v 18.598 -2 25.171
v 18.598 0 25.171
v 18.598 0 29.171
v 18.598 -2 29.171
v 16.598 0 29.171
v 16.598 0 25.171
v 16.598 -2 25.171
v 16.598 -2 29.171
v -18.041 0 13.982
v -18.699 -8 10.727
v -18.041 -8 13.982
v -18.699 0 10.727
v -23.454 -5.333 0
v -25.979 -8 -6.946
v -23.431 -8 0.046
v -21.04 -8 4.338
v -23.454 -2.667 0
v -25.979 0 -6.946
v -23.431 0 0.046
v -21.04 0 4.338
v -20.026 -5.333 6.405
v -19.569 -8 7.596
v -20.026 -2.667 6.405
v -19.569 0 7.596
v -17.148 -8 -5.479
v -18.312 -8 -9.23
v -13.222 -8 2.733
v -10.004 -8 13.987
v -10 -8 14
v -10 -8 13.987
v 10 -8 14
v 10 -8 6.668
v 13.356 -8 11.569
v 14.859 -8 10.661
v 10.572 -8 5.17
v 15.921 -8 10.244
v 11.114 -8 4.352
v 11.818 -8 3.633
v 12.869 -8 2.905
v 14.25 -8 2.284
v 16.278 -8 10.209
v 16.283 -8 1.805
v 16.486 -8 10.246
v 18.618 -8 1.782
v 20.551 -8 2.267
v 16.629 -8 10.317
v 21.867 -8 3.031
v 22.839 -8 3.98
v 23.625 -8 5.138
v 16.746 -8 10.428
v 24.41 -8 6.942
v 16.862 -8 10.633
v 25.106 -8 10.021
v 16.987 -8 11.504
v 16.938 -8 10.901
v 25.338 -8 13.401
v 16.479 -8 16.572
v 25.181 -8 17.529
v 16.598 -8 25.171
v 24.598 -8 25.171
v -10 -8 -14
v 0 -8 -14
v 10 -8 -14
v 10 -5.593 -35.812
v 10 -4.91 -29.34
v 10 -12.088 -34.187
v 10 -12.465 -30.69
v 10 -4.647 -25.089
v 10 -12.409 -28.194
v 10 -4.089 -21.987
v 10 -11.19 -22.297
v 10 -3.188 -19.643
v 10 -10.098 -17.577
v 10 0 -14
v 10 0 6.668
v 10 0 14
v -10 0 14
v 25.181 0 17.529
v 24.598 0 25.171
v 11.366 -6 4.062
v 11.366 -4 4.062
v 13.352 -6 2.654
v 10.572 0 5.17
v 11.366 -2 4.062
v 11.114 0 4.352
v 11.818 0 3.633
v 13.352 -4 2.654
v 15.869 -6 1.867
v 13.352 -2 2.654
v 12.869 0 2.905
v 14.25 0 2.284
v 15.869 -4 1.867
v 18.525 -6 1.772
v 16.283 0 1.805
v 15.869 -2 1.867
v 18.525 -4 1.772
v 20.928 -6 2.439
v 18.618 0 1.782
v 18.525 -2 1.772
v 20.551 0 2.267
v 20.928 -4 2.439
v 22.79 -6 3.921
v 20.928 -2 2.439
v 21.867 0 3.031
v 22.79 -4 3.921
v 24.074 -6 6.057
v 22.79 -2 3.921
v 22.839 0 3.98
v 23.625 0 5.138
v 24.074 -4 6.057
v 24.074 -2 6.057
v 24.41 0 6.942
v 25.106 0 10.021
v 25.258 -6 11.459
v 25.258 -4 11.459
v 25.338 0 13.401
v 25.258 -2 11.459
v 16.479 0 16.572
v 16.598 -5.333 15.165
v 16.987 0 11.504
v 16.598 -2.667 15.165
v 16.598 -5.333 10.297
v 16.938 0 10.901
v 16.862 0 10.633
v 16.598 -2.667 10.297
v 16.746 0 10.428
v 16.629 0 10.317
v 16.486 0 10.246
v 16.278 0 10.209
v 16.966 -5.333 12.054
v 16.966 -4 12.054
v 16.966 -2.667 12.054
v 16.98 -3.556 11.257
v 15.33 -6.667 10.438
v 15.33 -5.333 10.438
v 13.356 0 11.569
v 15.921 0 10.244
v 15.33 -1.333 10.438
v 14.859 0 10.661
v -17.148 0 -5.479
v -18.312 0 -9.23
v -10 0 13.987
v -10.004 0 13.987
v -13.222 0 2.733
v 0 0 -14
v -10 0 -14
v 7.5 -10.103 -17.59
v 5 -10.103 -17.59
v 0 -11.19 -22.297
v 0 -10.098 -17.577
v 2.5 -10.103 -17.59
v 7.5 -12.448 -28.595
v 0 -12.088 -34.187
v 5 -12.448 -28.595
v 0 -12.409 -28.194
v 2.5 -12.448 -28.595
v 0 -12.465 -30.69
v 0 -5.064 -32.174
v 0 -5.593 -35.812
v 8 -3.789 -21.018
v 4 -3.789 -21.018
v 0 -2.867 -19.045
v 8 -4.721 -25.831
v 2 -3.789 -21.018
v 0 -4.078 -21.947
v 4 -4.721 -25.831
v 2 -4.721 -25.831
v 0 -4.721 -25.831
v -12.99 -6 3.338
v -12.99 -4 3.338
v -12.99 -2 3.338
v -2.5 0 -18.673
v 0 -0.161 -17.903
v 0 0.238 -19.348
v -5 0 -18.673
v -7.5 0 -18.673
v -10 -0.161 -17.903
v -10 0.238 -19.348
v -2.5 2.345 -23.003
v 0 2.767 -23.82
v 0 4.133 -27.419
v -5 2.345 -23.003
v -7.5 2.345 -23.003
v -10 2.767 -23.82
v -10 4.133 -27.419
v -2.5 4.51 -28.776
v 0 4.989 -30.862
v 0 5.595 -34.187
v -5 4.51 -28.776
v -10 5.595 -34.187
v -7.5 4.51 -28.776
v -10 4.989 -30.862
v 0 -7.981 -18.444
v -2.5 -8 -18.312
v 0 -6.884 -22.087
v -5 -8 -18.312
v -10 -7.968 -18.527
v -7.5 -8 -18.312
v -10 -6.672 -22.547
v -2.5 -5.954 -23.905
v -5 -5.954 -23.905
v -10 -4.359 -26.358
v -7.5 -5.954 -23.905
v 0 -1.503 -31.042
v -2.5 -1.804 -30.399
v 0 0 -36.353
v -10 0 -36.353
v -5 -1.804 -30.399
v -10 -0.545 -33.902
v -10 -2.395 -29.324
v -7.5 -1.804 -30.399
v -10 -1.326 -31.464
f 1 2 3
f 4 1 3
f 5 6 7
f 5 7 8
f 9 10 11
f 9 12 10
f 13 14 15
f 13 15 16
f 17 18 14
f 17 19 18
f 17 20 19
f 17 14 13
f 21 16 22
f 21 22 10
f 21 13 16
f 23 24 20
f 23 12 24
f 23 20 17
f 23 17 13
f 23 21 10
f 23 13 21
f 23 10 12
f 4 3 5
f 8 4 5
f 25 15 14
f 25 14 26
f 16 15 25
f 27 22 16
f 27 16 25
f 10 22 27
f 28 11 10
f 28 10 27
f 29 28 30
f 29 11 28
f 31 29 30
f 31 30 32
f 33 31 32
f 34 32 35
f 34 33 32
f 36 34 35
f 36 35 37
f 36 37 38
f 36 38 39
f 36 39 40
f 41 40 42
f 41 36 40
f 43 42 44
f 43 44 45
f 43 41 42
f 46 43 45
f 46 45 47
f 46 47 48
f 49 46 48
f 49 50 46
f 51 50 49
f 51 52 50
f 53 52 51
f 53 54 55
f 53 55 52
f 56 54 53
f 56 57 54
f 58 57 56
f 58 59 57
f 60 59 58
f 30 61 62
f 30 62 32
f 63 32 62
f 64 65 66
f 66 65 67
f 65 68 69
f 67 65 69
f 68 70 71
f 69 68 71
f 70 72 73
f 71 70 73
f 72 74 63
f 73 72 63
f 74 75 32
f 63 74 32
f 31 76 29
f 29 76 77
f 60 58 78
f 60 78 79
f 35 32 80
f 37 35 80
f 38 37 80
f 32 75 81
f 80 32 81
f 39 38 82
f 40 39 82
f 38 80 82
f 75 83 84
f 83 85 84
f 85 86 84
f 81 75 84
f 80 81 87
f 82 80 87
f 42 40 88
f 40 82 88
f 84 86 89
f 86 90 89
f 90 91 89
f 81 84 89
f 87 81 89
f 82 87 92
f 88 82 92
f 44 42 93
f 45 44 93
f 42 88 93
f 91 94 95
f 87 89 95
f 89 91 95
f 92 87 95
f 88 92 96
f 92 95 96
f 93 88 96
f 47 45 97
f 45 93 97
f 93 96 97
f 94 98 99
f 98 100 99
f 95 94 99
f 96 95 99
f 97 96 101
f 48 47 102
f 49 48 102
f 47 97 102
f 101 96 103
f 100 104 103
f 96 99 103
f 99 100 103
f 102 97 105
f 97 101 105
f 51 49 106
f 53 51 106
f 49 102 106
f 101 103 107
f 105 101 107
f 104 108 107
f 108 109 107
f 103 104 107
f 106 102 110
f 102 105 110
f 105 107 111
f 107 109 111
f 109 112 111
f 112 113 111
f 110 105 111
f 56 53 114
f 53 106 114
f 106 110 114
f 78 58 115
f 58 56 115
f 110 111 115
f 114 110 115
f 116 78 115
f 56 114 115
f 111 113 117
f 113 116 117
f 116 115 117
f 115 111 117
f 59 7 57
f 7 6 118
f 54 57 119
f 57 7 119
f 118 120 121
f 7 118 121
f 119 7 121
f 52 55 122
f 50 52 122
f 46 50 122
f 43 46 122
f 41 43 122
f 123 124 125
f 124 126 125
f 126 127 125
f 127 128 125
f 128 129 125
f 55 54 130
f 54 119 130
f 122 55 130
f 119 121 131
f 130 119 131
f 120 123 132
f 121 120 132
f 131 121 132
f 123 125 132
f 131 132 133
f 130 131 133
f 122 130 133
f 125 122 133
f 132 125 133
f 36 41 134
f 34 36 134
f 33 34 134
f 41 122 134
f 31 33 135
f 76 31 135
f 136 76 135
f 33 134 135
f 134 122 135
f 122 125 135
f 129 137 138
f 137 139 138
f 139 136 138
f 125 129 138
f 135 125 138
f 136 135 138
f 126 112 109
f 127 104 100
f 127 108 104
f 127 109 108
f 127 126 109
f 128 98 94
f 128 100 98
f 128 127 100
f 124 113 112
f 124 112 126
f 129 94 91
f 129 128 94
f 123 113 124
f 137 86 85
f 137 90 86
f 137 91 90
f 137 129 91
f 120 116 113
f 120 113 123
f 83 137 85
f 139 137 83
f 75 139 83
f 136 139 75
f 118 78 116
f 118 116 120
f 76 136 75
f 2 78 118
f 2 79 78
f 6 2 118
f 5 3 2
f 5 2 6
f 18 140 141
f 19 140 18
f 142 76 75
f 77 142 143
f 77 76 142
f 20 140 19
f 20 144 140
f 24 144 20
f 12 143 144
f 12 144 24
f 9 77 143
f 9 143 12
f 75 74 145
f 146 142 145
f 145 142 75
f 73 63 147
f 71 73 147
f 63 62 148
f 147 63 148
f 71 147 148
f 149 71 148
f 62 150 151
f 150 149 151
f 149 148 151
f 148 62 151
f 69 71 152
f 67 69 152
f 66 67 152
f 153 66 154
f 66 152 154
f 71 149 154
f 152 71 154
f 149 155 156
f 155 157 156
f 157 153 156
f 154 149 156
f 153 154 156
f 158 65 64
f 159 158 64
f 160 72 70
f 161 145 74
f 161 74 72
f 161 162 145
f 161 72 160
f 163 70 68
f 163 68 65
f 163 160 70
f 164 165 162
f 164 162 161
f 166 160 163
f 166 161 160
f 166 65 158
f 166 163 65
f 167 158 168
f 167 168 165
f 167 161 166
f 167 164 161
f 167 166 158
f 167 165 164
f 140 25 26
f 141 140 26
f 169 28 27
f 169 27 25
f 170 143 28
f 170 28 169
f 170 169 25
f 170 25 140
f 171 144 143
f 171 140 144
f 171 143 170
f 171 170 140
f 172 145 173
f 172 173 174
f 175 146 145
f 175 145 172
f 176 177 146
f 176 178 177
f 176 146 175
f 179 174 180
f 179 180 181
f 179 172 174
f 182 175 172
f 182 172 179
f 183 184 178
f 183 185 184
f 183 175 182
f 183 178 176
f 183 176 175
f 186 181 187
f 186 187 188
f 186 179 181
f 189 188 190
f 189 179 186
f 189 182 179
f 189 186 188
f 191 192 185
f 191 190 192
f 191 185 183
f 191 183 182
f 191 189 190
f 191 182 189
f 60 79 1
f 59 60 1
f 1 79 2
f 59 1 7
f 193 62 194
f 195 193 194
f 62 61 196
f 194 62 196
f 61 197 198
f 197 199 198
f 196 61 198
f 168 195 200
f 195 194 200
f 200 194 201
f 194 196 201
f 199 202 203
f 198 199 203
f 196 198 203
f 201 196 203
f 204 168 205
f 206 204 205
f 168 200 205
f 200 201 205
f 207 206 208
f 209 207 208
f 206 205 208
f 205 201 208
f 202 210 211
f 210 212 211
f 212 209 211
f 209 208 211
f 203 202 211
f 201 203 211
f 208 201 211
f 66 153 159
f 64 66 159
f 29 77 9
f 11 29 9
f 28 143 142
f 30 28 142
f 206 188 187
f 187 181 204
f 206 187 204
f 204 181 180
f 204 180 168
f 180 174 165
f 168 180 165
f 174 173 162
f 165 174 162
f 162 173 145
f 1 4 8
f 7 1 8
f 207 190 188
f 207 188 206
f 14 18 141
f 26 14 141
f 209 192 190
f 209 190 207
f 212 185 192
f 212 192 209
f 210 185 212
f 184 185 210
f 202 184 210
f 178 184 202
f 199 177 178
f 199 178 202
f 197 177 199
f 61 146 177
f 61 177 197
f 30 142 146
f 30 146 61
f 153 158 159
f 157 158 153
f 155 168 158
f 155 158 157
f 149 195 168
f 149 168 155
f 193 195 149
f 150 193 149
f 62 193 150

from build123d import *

# Parameters (mm, degrees)
F1_DEPTH = 8
F3_DEPTH = 10
F5_DEPTH = 10
F6_W     = 2
F6_H     = 4
F7_DEPTH = 2


with BuildPart() as f1:
    # F0 (on Front) → F1 (new body)
    with BuildSketch(Plane.XZ):
        Polygon((10, 14), (-10, 14), (-10, 13.9871324164), align=None)
        with BuildLine():
            Line((-10, 13.9871324164), (-10, 14))
            add(Edge.make_bspline(
                [(-10, 14), (-10.0013069916, 13.9957099885), (-10.0026139149, 13.9914199529), (-10.0039207687, 13.9871298939)],
                knots=[0, 0, 0, 0, 0.0005634153, 0.0005634153, 0.0005634153, 0.0005634153], degree=3))
            Line((-10.0039207687, 13.9871298939), (-10, 13.9871324164))
        make_face()
        with BuildLine():
            add(Edge.make_bspline(
                [(-10, 14), (-10.0013069916, 13.9957099885), (-10.0026139149, 13.9914199529), (-10.0039207687, 13.9871298939)],
                knots=[0, 0, 0, 0, 0.0005634153, 0.0005634153, 0.0005634153, 0.0005634153], degree=3))
            Line((-10, 14), (-18.0412381887, 13.9819588512))
            Line((-18.0412381887, 13.9819588512), (-10.0039207687, 13.9871298939))
        make_face()
        with BuildLine():
            add(Edge.make_bspline(
                [(16.5979396552, 25.1705870032), (16.4242079195, 21.7814034546), (16.1292929338, 16.0281597324), (17.954552315, 8.034475712), (12.8387475955, 11.8710784645), (10, 14)],
                knots=[0, 0, 0, 0, 0.3895409215, 0.6612577422, 1, 1, 1, 1], degree=3))
            Line((10, 14), (10, 6.6676748447))
            add(Edge.make_bspline(
                [(10, 6.6676748447), (10.2523378817, 5.6781345951), (12.0047533576, 2.0571975496), (22.7187939676, 0.2071940627), (26.2944872886, 12.0093761919), (24.7818586393, 20.5559387988), (24.5979396552, 25.1705870032)],
                knots=[0.1642768485, 0.1642768485, 0.1642768485, 0.1642768485, 0.2408562316, 0.4776886549, 0.7182430468, 1, 1, 1, 1], degree=3))
            Line((24.5979396552, 25.1705870032), (16.5979396552, 25.1705870032))
        make_face()
        with BuildLine():
            Line((10, 6.6676748447), (10, 14))
            add(Edge.make_bspline(
                [(10, 14), (9.7266030818, 11.3954202783), (9.4586888759, 8.790420511), (10, 6.6676748447)],
                knots=[0, 0, 0, 0, 0.1642768485, 0.1642768485, 0.1642768485, 0.1642768485], degree=3))
        make_face()
        with BuildLine():
            add(Edge.make_bspline(
                [(10, 14), (9.7266030818, 11.3954202783), (9.4586888759, 8.790420511), (10, 6.6676748447)],
                knots=[0, 0, 0, 0, 0.1642768485, 0.1642768485, 0.1642768485, 0.1642768485], degree=3))
            Line((10, 14), (-10, 13.9871324164))
            Line((-10, 13.9871324164), (-10, -14))
            Line((-10, -14), (10, -14))
            Line((10, -14), (10, 6.6676748447))
        make_face()
        with BuildLine():
            add(Edge.make_bspline(
                [(-10.0039207687, 13.9871298939), (-10.557530177, 12.1697751658), (-11.6304994418, 8.5580895587), (-12.7269597722, 3.2080619518), (-15.9483733573, -2.8154175848), (-17.9189211947, -6.9664320189), (-18.3122973873, -9.2296893574)],
                knots=[0.0005634153, 0.0005634153, 0.0005634153, 0.0005634153, 0.2392373891, 0.4737911443, 0.7359345398, 1, 1, 1, 1], degree=3))
            Line((-10.0039207687, 13.9871298939), (-18.0412381887, 13.9819588512))
            add(Edge.make_bspline(
                [(-25.9793829173, -6.9458768703), (-25.2539642188, -4.5676118012), (-23.8093664017, 0.1684620471), (-19.5153648693, 6.2164021065), (-18.5387466084, 11.3611326258), (-18.0412381887, 13.9819588512)],
                knots=[0, 0, 0, 0, 0.3310306201, 0.65921393, 1, 1, 1, 1], degree=3))
            Line((-25.9793829173, -6.9458768703), (-18.3122973873, -9.2296893574))
        make_face()
    extrude(amount=F1_DEPTH)

    # F2 (on face) → F3 (join)
    with BuildSketch(Plane(origin=(-10, 0, 0), x_dir=(0, -1, 0), z_dir=(-1, 0, 0))):
        with BuildLine():
            Line((8, -14), (0, -14))
            add(Edge.make_bspline(
                [(0, -14), (0.2045836759, -15.6157837158), (0.6192637374, -18.8902476344), (-2.6809411284, -22.8970011823), (-4.6665400492, -28.7619394429), (-5.2928585425, -32.41202967), (-5.5954085566, -34.1871318147)],
                knots=[0, 0, 0, 0, 0.2346269916, 0.4754883695, 0.745007012, 1, 1, 1, 1], degree=3))
            Line((-5.5954085566, -34.1871318147), (0, -36.3530965155))
            add(Edge.make_bspline(
                [(8, -14), (8.1062479665, -15.4020488735), (8.3373620016, -18.4518314863), (6.2753772925, -24.1836933573), (1.2807636539, -30.1416891817), (0.4114158447, -34.3578251248), (0, -36.3530965155)],
                knots=[0, 0, 0, 0, 0.2121639716, 0.4615060148, 0.7451596188, 1, 1, 1, 1], degree=3))
        make_face()
    extrude(amount=-F3_DEPTH)

    # F4 (on face) → F5 (join)
    with BuildSketch(Plane.YZ):
        with BuildLine():
            add(Edge.make_bspline(
                [(0, -14), (-0.8240515576, -15.4606959655), (-2.3272345442, -18.1252934548), (-4.0109662696, -20.975339063), (-4.9011507822, -25.8671770363), (-4.9008100664, -31.9777881879), (-5.3812911094, -34.640359184), (-5.592783913, -35.811856389)],
                knots=[0, 0, 0, 0, 0.2049146304, 0.3738081441, 0.5819768139, 0.8160801398, 1, 1, 1, 1], degree=3))
            Line((0, -14), (-8, -14))
            add(Edge.make_bspline(
                [(-8, -14), (-8.789860184, -15.0975567751), (-10.5069200527, -17.4835115686), (-11.2071319942, -23.284631647), (-12.8483158405, -28.5406582263), (-12.3418277002, -32.3002507673), (-12.0876291767, -34.1871318147)],
                knots=[0, 0, 0, 0, 0.2229102117, 0.4845796593, 0.741318544, 1, 1, 1, 1], degree=3))
            Line((-12.0876291767, -34.1871318147), (-5.592783913, -35.811856389))
        make_face()
    extrude(amount=F5_DEPTH)

    # F6 (on face) → F7 (join)
    with BuildSketch(Plane(origin=(0, 0, 0), x_dir=(-1, 0, 0), z_dir=(0, 1, 0))):
        with Locations((-17.5979396552, 27.1705870032)):
            Rectangle(F6_W, F6_H)
    extrude(amount=-F7_DEPTH)


solid = f1.part
